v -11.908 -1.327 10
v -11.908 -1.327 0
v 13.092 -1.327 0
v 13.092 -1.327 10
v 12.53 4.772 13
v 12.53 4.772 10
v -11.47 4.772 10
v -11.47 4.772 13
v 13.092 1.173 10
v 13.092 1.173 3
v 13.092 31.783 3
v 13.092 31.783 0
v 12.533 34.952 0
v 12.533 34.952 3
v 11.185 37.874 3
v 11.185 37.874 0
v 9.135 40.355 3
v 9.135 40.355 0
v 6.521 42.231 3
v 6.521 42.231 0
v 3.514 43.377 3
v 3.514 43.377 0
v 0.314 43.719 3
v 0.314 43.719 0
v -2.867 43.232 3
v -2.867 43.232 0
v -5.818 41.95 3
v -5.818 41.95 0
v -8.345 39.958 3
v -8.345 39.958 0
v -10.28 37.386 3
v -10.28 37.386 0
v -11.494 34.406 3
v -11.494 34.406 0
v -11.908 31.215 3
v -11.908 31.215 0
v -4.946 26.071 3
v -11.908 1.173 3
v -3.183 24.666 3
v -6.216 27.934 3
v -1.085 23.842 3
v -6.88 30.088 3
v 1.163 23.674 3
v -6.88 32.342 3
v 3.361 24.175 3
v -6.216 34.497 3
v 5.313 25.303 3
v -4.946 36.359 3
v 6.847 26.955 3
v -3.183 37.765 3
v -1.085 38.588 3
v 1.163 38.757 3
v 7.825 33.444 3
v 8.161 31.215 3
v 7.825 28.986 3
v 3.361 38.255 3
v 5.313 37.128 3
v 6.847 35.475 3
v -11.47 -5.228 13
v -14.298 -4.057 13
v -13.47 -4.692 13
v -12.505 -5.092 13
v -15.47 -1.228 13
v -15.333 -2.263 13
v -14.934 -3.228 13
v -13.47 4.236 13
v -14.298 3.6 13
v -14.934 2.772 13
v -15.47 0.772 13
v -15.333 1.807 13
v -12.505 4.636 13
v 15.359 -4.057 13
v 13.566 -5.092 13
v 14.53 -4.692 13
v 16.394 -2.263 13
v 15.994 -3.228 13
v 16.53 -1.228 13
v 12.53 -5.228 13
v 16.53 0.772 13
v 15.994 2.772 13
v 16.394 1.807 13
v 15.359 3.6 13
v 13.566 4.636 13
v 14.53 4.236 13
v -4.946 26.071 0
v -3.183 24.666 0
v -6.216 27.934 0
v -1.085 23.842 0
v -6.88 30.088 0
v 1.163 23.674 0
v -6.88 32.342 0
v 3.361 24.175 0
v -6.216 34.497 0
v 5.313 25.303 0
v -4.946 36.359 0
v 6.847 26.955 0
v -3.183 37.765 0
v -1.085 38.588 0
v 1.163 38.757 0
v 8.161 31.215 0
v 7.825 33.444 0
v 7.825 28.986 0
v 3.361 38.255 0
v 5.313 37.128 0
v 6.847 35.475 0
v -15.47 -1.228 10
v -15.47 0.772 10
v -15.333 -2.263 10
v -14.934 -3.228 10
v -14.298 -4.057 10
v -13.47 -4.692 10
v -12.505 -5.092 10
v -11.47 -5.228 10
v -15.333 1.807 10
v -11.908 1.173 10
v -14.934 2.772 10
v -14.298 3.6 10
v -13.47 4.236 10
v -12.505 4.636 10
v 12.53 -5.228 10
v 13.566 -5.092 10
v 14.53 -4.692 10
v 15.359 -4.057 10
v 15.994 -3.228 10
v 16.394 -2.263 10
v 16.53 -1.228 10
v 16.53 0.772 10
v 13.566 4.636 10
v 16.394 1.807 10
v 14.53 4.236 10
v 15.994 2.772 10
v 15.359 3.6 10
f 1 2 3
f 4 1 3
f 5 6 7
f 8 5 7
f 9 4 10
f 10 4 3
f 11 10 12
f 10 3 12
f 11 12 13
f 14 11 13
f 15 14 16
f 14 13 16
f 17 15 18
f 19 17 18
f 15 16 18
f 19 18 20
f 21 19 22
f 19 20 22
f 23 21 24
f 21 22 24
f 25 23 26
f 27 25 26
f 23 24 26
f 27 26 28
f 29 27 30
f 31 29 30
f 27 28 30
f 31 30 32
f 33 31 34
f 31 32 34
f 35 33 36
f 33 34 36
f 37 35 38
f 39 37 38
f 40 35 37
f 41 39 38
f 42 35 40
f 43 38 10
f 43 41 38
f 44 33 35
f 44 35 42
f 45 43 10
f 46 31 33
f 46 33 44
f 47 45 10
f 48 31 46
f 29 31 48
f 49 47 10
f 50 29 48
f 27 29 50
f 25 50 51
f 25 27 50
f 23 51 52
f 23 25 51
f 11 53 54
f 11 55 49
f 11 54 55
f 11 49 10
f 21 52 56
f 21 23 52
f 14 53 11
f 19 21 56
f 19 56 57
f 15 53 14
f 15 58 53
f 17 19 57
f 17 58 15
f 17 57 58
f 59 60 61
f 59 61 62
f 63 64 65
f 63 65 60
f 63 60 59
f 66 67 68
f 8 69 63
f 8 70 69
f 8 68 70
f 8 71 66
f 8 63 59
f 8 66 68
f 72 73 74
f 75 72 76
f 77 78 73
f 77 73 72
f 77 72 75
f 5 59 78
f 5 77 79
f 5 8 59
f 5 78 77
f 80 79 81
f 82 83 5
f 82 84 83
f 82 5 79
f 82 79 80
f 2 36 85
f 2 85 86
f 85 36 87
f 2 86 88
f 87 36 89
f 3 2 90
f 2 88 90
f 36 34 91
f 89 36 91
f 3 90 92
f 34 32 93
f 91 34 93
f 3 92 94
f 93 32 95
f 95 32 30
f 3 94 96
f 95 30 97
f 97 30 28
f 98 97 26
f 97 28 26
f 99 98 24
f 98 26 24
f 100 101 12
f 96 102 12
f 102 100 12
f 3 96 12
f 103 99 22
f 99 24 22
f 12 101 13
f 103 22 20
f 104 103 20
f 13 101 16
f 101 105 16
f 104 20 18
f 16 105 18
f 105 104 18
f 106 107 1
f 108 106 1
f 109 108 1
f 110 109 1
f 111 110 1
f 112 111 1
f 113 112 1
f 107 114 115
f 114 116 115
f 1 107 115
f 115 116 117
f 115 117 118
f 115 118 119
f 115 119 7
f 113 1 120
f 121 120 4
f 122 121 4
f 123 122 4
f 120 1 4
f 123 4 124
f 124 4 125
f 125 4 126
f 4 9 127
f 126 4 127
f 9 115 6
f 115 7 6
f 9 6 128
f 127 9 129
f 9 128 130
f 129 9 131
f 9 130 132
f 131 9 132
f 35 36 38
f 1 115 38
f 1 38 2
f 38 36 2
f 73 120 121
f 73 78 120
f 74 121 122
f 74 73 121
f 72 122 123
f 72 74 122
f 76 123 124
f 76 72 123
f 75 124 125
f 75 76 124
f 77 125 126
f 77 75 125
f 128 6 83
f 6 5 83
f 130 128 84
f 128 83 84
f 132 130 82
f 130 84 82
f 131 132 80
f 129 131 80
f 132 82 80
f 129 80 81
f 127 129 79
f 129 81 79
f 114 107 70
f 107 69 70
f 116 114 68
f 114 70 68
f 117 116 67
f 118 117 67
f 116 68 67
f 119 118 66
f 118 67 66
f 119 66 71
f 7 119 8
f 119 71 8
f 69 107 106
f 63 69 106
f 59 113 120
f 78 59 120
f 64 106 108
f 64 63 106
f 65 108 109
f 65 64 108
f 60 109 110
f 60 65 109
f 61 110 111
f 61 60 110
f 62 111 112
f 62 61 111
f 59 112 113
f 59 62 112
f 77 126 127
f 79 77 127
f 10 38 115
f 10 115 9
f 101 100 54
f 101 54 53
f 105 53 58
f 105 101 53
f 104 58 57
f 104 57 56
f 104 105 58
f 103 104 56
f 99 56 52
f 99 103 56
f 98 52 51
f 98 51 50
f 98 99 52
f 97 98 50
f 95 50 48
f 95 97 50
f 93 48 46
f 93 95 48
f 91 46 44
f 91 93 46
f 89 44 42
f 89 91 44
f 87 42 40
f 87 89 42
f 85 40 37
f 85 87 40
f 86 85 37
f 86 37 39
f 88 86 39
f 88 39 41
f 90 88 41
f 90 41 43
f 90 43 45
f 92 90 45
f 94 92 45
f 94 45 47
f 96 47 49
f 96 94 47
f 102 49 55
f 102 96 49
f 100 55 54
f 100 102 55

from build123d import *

# Parameters (mm, degrees)
F0_R     = 7.5625599735
F0_W     = 25
F0_H     = 3.598708484
F0_H_2   = 2.5
F1_DEPTH = 3
F2_DEPTH = 10
F3_START = 10
F3_DEPTH = 3
F4_R     = 4


with BuildPart() as f1:
    # F0 (on Top) → F1 (new body)
    with BuildSketch(Plane.XY):
        with BuildLine():
            Line((-11.908370629, 31.2152840197), (-11.908370629, 4.7718174662))
            Line((-11.908370629, 4.7718174662), (13.091629371, 4.7718174662))
            Line((13.091629371, 4.7718174662), (13.091629371, 31.7831486464))
            ThreePointArc((13.091629371, 31.7831486464), (0.3140732241, 43.7185083062), (-11.908370629, 31.2152840197))
        make_face()
        with Locations((0.5980787757, 31.2152840197)):
            Circle(F0_R, mode=Mode.SUBTRACT)
        with Locations((0.591629371, 2.9724632242)):
            Rectangle(F0_W, F0_H)
        with Locations((0.591629371, -0.0768910178)):
            Rectangle(F0_W, F0_H_2)
    extrude(amount=F1_DEPTH)

    # F0 (on Top) → F2 (join)
    with BuildSketch(Plane.XY):
        with Locations((0.591629371, -0.0768910178)):
            Rectangle(F0_W, F0_H_2)
    extrude(amount=F2_DEPTH)

    # F0 (on Top) → F3 (join)
    with BuildSketch(Plane.XY.offset(F3_START)):
        with Locations((0.591629371, 2.9724632242)):
            Rectangle(F0_W, F0_H)
        Polygon((-11.908370629, -1.3268910178), (-11.908370629, 1.1731089822), (-11.908370629, 4.7718174662), (-15.4697376937, 4.7718174662), (-15.4697376937, -5.2281825338), (16.5302623063, -5.2281825338), (16.5302623063, 4.7718174662), (13.091629371, 4.7718174662), (13.091629371, 1.1731089822), (13.091629371, -1.3268910178), align=None)
        with Locations((0.591629371, -0.0768910178)):
            Rectangle(F0_W, F0_H_2)
    extrude(amount=F3_DEPTH)

    # F4
    f4_edges = [f1.edges().sort_by_distance(p)[0] for p in [
        (16.530262, -5.228183, 11.5),
        (16.530262, 4.771817, 11.5),
        (-15.469738, -5.228183, 11.5),
        (-15.469738, 4.771817, 11.5),
    ]]
    fillet(f4_edges, radius=F4_R)


solid = f1.part
